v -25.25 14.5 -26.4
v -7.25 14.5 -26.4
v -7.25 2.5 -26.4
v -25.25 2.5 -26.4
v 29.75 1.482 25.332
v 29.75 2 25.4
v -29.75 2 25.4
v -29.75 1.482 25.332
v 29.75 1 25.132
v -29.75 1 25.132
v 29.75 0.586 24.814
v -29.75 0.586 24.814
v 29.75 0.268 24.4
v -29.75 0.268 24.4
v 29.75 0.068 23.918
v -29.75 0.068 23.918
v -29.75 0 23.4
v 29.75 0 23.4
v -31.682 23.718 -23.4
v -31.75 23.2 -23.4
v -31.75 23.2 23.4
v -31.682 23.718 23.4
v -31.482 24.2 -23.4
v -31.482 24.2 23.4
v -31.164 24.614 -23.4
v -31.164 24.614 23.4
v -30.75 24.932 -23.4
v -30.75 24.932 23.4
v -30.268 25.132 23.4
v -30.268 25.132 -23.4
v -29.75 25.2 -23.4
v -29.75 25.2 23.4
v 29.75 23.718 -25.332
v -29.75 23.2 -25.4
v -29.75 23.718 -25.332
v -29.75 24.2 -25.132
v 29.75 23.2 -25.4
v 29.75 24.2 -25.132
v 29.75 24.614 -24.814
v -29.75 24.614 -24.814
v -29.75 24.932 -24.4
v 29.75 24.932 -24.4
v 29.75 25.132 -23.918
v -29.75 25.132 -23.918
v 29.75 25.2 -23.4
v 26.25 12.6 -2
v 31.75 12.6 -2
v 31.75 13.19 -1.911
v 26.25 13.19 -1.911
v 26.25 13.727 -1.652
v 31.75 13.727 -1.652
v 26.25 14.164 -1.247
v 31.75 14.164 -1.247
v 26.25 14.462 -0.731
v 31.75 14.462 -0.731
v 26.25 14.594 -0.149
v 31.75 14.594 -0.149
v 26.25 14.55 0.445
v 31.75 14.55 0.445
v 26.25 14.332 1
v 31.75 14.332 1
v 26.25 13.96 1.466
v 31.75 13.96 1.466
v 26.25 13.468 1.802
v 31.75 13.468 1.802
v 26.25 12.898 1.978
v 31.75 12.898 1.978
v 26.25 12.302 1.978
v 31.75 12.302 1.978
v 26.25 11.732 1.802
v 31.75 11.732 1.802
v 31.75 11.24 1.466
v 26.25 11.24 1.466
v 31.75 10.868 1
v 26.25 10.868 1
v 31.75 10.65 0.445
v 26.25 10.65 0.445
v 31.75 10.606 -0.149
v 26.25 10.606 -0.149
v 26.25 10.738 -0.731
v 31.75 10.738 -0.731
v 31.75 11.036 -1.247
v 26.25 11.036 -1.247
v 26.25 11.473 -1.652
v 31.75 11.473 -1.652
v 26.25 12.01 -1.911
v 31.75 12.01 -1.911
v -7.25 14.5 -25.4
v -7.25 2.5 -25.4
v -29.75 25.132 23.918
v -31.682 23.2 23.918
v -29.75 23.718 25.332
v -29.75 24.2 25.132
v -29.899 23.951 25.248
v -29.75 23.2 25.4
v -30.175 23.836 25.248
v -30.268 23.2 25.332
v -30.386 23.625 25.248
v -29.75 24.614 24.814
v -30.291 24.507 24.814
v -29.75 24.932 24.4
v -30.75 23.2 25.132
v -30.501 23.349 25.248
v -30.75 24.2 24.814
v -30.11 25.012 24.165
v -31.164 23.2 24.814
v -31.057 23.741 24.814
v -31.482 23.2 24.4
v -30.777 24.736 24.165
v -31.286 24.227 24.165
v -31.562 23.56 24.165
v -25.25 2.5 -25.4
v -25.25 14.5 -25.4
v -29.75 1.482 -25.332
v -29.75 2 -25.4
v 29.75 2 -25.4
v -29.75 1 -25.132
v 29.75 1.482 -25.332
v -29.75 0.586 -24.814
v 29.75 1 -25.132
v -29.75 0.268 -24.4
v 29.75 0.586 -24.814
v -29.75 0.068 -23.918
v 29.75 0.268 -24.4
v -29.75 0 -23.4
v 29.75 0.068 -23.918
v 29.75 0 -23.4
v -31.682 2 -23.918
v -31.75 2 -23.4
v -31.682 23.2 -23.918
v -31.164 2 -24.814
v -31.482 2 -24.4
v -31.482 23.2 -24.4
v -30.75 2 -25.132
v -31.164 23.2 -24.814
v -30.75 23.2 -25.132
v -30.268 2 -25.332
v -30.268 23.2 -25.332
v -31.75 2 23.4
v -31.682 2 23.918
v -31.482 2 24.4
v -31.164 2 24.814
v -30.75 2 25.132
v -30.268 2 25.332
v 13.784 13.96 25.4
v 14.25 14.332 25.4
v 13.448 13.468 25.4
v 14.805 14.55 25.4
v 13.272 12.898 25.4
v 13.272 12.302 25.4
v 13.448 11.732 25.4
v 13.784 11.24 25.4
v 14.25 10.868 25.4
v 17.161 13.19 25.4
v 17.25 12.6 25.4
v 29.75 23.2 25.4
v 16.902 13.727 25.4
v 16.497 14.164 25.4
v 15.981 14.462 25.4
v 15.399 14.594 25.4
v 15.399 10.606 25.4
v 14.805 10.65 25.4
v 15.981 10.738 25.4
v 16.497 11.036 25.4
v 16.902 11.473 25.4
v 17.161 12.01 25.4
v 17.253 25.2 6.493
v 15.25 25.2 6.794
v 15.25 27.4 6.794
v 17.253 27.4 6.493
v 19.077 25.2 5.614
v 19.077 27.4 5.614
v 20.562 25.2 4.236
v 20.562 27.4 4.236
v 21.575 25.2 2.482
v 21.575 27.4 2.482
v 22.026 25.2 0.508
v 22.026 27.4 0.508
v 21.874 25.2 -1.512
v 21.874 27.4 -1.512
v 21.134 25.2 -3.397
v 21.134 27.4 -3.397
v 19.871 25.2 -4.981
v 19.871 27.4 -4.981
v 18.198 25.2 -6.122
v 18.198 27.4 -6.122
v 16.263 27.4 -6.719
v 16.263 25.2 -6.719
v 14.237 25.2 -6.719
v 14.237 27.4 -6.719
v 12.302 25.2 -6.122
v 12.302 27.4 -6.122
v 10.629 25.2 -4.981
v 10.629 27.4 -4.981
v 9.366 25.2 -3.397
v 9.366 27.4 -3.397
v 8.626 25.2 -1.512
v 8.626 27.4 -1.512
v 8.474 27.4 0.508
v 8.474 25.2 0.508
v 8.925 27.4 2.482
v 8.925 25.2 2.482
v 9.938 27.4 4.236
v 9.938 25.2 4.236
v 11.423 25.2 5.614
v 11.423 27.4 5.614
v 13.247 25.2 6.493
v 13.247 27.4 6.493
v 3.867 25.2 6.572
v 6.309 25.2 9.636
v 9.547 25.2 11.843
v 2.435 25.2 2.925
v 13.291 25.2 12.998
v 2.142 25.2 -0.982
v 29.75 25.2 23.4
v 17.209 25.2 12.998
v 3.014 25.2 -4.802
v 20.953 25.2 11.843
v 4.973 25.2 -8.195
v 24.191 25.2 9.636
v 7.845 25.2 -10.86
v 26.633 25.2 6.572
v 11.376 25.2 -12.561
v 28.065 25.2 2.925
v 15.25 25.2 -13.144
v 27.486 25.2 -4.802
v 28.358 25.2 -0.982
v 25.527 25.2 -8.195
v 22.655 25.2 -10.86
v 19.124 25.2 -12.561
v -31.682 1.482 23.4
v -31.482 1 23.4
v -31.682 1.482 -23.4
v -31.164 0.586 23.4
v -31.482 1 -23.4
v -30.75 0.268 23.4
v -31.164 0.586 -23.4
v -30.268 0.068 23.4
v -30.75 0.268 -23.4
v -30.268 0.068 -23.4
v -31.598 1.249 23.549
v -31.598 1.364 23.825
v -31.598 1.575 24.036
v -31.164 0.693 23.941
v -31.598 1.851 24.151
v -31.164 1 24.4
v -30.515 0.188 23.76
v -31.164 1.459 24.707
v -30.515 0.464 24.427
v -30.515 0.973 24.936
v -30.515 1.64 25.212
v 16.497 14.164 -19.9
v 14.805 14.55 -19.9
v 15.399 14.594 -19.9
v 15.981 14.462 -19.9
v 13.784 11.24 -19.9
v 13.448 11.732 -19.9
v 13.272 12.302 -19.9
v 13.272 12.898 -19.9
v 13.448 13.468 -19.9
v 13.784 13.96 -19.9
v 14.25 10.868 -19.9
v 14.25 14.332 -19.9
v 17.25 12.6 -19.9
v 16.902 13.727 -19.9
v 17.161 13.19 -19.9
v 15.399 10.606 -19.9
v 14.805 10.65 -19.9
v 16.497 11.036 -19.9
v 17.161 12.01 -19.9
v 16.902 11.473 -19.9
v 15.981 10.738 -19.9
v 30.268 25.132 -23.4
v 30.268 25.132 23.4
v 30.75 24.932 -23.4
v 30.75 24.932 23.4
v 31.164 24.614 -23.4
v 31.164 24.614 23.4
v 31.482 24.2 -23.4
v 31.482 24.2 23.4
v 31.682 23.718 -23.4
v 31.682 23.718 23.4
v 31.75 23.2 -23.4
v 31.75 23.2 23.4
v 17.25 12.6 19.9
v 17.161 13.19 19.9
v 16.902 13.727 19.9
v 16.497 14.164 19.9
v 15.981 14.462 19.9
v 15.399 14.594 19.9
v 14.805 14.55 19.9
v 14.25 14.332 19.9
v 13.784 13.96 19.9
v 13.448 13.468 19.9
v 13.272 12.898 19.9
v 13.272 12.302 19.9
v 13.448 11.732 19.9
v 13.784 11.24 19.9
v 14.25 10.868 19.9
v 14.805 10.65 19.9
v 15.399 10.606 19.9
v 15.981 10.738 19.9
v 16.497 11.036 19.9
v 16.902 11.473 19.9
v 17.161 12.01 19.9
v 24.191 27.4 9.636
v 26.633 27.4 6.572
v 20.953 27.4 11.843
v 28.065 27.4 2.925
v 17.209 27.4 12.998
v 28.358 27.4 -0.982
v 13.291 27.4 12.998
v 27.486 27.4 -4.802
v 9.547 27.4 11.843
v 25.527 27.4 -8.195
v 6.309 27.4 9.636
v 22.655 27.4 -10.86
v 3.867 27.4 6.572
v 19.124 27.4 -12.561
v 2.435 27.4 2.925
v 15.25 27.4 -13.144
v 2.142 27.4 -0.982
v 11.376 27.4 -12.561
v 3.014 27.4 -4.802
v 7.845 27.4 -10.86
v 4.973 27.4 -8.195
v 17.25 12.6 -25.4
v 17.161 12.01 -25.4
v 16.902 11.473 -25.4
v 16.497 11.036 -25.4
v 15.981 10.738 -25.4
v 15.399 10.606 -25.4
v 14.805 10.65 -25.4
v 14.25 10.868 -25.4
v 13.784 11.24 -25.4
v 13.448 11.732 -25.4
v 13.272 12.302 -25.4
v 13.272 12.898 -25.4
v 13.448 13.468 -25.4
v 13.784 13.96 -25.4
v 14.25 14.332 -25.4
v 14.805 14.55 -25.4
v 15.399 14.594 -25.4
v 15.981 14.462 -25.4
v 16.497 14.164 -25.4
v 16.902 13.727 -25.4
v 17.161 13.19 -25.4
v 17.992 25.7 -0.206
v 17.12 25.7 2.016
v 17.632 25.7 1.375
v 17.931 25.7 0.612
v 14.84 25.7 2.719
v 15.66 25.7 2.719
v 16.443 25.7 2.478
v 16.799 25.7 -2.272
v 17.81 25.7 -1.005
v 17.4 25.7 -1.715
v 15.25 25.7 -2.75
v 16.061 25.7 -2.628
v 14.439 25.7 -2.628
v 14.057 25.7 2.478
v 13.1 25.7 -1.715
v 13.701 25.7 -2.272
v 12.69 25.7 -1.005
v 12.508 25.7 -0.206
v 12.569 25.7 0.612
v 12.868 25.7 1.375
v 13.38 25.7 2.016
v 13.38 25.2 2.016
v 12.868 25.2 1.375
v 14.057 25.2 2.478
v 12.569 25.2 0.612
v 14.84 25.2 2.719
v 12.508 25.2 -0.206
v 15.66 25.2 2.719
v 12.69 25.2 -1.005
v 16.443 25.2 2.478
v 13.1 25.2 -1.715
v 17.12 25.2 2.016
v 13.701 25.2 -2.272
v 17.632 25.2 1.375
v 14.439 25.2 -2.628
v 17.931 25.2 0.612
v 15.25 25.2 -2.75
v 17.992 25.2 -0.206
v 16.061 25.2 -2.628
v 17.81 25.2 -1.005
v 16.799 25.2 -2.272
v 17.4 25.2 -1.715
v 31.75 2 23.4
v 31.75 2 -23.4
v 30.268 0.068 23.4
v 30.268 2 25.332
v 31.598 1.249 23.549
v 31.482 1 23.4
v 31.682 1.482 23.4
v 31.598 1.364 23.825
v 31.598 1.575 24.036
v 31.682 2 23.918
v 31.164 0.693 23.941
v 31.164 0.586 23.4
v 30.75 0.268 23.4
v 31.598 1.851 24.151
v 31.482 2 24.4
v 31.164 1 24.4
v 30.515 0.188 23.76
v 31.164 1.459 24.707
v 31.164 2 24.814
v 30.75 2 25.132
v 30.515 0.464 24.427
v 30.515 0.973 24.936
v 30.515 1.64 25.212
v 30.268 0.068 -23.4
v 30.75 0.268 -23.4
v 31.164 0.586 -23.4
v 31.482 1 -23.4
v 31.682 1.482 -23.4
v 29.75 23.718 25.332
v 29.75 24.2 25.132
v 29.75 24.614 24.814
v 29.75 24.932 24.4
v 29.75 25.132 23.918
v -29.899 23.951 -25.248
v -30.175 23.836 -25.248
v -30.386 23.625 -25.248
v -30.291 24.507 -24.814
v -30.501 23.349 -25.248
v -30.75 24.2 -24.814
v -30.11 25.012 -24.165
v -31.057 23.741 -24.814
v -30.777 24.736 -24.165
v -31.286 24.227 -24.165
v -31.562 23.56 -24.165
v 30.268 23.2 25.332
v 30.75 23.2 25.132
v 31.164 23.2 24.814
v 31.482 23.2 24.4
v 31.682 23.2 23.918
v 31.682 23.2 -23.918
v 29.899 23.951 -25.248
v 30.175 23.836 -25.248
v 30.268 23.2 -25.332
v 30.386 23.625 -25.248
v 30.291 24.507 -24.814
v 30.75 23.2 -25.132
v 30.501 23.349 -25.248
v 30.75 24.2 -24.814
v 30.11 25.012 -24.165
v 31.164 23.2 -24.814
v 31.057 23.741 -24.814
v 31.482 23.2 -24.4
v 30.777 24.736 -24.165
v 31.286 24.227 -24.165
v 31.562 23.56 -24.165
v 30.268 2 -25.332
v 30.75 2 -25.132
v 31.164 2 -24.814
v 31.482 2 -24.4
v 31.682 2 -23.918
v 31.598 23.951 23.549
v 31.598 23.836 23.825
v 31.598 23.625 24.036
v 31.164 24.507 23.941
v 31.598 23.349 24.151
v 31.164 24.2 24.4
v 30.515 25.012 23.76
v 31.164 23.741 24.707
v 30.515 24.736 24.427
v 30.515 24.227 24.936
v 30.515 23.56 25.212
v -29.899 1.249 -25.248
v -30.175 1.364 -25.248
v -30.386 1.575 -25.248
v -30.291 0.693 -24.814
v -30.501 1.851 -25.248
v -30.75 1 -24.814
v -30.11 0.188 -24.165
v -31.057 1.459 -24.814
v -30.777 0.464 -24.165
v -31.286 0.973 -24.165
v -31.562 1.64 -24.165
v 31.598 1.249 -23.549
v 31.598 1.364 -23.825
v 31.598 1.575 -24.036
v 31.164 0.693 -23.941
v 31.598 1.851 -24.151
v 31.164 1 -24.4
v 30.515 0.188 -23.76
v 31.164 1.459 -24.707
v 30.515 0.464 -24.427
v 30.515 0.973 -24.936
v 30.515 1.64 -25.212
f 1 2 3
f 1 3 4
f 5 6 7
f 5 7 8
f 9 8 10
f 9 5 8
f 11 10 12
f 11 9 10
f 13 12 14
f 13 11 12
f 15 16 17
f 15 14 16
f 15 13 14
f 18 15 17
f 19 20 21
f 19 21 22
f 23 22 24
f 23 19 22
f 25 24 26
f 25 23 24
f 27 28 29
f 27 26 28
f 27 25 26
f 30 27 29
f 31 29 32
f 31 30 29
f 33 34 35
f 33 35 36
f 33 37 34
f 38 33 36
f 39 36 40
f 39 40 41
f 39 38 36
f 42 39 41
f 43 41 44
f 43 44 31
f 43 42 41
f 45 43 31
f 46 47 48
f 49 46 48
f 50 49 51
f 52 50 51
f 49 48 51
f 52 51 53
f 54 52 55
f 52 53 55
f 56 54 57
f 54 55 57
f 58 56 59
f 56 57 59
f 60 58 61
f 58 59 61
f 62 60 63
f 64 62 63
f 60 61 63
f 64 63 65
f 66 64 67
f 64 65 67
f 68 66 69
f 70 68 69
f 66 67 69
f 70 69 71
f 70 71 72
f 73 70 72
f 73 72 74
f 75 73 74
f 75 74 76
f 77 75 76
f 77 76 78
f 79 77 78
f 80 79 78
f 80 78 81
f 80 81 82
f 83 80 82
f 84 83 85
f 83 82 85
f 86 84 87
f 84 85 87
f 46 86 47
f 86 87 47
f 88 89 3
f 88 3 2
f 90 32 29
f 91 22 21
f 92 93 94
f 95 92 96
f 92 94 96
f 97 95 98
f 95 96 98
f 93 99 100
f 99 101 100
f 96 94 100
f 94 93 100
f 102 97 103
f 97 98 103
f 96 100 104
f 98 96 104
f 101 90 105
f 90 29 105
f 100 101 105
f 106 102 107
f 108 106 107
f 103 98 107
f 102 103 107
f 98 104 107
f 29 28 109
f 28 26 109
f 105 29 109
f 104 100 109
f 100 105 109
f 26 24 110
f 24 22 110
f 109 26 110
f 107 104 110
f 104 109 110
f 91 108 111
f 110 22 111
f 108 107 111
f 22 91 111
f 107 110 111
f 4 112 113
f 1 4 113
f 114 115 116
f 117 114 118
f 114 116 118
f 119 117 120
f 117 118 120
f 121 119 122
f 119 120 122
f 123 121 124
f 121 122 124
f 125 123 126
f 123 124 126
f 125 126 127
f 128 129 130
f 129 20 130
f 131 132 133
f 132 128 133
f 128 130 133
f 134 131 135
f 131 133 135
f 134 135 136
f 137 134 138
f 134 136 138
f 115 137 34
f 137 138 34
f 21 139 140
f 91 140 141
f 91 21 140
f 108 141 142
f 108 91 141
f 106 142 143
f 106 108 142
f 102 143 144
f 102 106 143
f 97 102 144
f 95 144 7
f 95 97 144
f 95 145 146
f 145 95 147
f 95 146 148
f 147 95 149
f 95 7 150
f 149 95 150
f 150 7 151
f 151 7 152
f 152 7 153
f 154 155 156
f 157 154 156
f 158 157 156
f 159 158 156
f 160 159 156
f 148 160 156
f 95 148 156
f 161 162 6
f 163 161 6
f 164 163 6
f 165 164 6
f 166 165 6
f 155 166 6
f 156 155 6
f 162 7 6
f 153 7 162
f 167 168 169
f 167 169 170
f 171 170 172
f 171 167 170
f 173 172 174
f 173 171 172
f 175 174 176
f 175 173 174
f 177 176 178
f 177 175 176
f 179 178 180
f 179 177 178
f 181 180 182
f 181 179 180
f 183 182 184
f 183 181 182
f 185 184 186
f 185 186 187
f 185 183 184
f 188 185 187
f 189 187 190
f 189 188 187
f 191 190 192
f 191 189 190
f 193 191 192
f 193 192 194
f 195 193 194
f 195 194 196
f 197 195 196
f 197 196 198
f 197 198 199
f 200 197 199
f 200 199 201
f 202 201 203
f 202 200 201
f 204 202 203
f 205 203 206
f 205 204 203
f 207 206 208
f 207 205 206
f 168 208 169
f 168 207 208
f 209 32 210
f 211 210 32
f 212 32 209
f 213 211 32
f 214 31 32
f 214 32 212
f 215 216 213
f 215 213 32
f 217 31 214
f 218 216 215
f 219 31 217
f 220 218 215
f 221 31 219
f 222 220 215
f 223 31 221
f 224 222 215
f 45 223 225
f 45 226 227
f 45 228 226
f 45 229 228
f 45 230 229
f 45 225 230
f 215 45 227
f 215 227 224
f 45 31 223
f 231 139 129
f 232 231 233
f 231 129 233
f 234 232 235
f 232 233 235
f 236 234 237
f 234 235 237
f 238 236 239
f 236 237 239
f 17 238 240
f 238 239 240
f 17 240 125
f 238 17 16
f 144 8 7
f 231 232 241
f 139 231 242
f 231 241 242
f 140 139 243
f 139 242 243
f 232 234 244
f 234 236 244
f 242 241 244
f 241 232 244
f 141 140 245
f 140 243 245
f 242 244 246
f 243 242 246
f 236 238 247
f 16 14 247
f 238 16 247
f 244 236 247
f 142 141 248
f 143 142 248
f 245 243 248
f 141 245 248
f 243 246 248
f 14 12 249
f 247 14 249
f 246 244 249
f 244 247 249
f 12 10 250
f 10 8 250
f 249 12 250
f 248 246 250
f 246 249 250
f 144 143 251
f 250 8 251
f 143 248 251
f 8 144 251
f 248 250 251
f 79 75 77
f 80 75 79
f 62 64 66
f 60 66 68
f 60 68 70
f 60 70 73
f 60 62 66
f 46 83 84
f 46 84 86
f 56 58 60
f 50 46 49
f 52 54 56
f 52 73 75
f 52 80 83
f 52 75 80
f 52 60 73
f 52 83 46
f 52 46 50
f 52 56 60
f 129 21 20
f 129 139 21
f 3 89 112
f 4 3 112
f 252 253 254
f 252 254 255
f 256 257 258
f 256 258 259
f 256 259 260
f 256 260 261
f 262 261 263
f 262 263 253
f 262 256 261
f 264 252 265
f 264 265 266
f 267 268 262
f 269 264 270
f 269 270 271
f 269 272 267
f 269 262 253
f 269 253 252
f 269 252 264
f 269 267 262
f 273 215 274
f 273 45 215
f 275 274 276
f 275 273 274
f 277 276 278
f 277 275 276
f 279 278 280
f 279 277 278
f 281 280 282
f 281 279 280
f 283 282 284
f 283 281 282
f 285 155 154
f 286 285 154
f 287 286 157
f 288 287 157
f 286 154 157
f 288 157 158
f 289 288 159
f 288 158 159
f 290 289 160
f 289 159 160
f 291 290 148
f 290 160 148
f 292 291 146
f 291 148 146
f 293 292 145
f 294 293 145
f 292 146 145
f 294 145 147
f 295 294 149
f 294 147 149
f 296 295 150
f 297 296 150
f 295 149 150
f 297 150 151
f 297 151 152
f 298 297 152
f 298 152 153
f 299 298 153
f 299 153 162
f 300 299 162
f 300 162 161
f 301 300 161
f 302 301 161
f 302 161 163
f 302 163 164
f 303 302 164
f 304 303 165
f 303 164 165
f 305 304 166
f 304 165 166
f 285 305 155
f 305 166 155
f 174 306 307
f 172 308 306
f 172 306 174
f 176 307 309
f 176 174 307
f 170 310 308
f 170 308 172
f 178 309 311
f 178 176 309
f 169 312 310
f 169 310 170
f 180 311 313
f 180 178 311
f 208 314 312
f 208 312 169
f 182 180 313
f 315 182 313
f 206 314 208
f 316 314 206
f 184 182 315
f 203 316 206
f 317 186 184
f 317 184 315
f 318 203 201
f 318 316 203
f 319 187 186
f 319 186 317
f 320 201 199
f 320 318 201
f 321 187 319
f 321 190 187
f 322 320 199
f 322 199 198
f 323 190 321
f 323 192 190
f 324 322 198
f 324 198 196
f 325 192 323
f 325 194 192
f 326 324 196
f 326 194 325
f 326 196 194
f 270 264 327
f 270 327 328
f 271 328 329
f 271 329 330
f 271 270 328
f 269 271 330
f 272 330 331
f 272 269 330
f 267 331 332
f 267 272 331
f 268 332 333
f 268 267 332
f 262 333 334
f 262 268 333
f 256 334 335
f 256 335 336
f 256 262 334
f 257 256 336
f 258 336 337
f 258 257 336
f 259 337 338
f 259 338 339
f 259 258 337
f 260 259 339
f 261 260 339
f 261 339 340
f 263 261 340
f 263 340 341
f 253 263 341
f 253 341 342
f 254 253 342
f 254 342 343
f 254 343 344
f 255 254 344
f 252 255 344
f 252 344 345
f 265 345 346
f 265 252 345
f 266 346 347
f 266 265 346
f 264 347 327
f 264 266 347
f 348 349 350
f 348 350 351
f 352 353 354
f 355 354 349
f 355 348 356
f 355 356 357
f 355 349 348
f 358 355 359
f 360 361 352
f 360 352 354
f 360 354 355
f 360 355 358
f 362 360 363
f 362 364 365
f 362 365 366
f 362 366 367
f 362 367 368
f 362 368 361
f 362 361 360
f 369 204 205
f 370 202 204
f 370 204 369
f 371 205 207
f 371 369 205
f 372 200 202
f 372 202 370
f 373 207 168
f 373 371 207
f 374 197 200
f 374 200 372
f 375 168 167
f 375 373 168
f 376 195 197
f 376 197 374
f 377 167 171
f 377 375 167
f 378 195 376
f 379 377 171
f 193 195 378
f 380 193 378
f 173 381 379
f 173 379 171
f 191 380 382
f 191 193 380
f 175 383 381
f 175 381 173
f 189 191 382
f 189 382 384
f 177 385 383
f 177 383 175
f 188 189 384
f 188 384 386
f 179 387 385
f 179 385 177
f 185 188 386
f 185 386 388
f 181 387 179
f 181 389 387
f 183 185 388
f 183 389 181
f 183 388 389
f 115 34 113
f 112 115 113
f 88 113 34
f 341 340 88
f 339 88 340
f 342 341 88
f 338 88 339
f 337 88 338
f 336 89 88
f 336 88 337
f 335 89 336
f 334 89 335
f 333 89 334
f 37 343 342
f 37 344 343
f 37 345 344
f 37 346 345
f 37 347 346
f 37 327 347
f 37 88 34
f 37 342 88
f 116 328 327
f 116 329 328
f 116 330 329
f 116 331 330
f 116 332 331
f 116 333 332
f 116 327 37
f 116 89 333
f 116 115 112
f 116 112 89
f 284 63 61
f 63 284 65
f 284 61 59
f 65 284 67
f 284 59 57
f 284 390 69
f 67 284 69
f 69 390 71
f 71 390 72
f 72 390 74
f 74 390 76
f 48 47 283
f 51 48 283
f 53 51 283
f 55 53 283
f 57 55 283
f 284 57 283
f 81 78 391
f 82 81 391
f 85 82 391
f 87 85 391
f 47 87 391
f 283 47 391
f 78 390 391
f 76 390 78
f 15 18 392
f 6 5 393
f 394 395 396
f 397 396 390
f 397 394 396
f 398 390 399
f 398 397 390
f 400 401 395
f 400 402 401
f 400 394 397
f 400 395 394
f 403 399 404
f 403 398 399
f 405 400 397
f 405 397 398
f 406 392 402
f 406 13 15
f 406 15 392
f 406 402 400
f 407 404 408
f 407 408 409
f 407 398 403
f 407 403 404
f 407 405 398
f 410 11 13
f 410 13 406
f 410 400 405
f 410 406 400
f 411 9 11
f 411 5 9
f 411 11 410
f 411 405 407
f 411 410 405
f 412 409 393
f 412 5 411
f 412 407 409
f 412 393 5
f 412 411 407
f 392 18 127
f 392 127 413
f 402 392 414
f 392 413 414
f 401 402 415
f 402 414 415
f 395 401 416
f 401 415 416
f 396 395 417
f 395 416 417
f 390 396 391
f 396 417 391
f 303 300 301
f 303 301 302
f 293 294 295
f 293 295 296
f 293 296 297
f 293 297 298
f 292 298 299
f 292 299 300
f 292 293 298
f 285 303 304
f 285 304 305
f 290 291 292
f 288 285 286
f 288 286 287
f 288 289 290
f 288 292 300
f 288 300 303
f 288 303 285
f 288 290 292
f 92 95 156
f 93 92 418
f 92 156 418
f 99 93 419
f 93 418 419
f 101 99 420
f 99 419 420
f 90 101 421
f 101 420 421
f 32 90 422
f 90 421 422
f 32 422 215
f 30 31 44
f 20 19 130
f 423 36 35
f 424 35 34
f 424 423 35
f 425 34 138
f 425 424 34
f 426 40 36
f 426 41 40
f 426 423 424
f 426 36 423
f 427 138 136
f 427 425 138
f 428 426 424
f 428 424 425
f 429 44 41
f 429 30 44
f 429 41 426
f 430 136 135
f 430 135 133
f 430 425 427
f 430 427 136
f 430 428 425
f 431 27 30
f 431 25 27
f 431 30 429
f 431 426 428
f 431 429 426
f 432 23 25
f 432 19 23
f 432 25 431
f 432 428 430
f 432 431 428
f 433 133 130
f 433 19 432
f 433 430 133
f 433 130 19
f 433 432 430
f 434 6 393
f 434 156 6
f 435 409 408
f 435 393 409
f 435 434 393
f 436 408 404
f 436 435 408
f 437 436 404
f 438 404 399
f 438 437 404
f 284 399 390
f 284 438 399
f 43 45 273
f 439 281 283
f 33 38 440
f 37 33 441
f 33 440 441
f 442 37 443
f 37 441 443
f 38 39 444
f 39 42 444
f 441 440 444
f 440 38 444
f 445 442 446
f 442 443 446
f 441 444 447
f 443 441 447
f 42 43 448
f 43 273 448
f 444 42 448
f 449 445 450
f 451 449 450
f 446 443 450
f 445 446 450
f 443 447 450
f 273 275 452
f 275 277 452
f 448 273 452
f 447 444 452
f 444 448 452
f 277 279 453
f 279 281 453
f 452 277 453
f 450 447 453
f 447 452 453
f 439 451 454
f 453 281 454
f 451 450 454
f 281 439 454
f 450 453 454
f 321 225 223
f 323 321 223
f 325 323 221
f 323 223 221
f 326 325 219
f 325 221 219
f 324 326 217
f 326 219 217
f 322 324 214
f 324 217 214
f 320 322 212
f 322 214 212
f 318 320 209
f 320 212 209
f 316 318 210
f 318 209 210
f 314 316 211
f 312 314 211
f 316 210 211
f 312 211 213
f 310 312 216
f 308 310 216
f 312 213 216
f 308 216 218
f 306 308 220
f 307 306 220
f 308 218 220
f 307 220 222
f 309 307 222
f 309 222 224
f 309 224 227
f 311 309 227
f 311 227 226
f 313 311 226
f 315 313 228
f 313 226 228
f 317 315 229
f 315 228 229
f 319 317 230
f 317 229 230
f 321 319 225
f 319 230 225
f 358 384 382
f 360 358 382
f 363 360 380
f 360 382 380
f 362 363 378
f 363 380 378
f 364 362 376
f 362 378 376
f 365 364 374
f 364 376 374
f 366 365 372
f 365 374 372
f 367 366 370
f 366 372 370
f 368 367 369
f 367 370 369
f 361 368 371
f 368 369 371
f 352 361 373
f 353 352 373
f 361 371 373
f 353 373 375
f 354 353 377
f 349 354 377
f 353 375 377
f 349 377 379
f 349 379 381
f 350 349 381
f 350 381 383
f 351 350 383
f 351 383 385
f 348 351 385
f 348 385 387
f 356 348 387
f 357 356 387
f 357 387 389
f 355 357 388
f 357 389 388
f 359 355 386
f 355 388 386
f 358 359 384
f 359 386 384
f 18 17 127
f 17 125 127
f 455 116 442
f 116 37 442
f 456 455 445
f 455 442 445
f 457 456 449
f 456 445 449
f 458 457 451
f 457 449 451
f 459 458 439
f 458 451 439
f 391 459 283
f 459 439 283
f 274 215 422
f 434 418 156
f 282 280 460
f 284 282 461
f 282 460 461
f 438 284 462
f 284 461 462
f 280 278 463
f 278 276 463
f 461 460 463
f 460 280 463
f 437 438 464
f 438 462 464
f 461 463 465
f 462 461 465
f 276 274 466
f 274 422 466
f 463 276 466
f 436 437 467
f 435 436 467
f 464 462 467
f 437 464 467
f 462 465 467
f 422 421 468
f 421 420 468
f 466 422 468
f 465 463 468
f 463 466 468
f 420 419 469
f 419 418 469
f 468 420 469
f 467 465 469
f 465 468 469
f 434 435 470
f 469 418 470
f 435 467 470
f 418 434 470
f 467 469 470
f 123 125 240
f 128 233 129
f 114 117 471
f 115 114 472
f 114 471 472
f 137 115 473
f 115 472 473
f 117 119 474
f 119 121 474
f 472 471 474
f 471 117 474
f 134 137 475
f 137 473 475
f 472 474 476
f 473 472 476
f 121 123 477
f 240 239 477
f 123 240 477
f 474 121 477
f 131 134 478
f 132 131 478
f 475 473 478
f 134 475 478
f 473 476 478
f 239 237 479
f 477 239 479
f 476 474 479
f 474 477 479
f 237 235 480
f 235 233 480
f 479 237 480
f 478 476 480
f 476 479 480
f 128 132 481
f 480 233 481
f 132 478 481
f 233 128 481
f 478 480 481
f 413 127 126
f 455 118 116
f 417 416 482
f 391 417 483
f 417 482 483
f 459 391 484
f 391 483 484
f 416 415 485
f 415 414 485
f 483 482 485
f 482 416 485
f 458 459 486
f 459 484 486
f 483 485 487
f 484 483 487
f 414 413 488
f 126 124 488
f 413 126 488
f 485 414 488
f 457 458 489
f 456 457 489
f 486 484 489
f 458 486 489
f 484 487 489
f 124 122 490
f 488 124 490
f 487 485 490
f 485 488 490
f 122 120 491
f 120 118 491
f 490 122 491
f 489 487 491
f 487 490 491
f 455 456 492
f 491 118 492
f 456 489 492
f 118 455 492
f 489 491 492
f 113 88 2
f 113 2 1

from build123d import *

# Parameters (mm, degrees)
SKETCH1_W           = 63.5
SKETCH1_H           = 50.8
BOSS_EXTRUDE1_DEPTH = 25.2
SKETCH2_R           = 13.1445
SKETCH2_R_2         = 6.7945
BOSS_EXTRUDE2_DEPTH = 2.2
SKETCH3_R           = 2
CUT_EXTRUDE1_DEPTH  = 5.5
SKETCH4_R           = 2
CUT_EXTRUDE2_DEPTH  = 5.5
CUT_EXTRUDE3_START  = -5.5
SKETCH5_R           = 2
CUT_EXTRUDE3_DEPTH  = 5.5
FILLET1_R           = 2
SKETCH6_W           = 18
SKETCH6_H           = 12
BOSS_EXTRUDE3_DEPTH = 1
SKETCH7_R           = 2.75
BOSS_EXTRUDE4_DEPTH = 0.5


with BuildPart() as part:
    # Sketch1 → Boss-Extrude1 (new body)
    with BuildSketch(Plane(origin=(0, 0, 0), x_dir=(1, 0, 0), z_dir=(0, 1, 0))):
        Rectangle(SKETCH1_W, SKETCH1_H)
    extrude(amount=BOSS_EXTRUDE1_DEPTH)

    # Sketch2 → Boss-Extrude2 (add)
    with BuildSketch(Plane(origin=(0, 25.2, 0), x_dir=(1, 0, 0), z_dir=(0, 1, 0))):
        with Locations(Location((15.25, 0, 0), (0, 0, 90))):
            Circle(SKETCH2_R)
        with Locations(Location((15.25, 0, 0), (0, 0, 270))):
            Circle(SKETCH2_R_2, mode=Mode.SUBTRACT)
    extrude(amount=BOSS_EXTRUDE2_DEPTH)

    # Sketch3 → Cut-Extrude1 (cut)
    with BuildSketch(Plane.XY.offset(25.4)):
        with Locations((15.25, 12.6)):
            Circle(SKETCH3_R)
    extrude(amount=-CUT_EXTRUDE1_DEPTH, mode=Mode.SUBTRACT)

    # Sketch4 → Cut-Extrude2 (cut)
    with BuildSketch(Plane(origin=(31.75, 0, 0), x_dir=(0, 0, -1), z_dir=(1, 0, 0))):
        with Locations((0, 12.6)):
            Circle(SKETCH4_R)
    extrude(amount=-CUT_EXTRUDE2_DEPTH, mode=Mode.SUBTRACT)

    # Sketch5 → Cut-Extrude3 (cut)
    with BuildSketch(Plane(origin=(0, 0, -25.4), x_dir=(-1, 0, 0), z_dir=(0, 0, -1)).offset(CUT_EXTRUDE3_START)):
        with Locations(Location((-15.25, 12.6, 0), (0, 0, 180))):
            Circle(SKETCH5_R)
    extrude(amount=CUT_EXTRUDE3_DEPTH, mode=Mode.SUBTRACT)

    # Fillet1
    fillet1_edges = [part.edges().sort_by_distance(p)[0] for p in [
        (-31.75, 25.2, 0),
        (0, 25.2, 25.4),
        (31.75, 25.2, 0),
        (0, 0, 25.4),
        (-31.75, 0, 0),
        (0, 0, -25.4),
        (31.75, 0, 0),
        (0, 25.2, -25.4),
        (31.75, 12.6, 25.4),
        (-31.75, 12.6, 25.4),
        (-31.75, 12.6, -25.4),
        (31.75, 12.6, -25.4),
    ]]
    fillet(fillet1_edges, radius=FILLET1_R)

    # Sketch6 → Boss-Extrude3 (add)
    with BuildSketch(Plane(origin=(0, 0, -25.4), x_dir=(-1, 0, 0), z_dir=(0, 0, -1))):
        with Locations((16.25, 8.5)):
            Rectangle(SKETCH6_W, SKETCH6_H)
    extrude(amount=BOSS_EXTRUDE3_DEPTH)

    # Sketch7 → Boss-Extrude4 (add)
    with BuildSketch(Plane(origin=(0, 25.2, 0), x_dir=(1, 0, 0), z_dir=(0, 1, 0))):
        with Locations(Location((15.25, 0, 0), (0, 0, 90))):
            Circle(SKETCH7_R)
    extrude(amount=BOSS_EXTRUDE4_DEPTH)


solid = part.part
